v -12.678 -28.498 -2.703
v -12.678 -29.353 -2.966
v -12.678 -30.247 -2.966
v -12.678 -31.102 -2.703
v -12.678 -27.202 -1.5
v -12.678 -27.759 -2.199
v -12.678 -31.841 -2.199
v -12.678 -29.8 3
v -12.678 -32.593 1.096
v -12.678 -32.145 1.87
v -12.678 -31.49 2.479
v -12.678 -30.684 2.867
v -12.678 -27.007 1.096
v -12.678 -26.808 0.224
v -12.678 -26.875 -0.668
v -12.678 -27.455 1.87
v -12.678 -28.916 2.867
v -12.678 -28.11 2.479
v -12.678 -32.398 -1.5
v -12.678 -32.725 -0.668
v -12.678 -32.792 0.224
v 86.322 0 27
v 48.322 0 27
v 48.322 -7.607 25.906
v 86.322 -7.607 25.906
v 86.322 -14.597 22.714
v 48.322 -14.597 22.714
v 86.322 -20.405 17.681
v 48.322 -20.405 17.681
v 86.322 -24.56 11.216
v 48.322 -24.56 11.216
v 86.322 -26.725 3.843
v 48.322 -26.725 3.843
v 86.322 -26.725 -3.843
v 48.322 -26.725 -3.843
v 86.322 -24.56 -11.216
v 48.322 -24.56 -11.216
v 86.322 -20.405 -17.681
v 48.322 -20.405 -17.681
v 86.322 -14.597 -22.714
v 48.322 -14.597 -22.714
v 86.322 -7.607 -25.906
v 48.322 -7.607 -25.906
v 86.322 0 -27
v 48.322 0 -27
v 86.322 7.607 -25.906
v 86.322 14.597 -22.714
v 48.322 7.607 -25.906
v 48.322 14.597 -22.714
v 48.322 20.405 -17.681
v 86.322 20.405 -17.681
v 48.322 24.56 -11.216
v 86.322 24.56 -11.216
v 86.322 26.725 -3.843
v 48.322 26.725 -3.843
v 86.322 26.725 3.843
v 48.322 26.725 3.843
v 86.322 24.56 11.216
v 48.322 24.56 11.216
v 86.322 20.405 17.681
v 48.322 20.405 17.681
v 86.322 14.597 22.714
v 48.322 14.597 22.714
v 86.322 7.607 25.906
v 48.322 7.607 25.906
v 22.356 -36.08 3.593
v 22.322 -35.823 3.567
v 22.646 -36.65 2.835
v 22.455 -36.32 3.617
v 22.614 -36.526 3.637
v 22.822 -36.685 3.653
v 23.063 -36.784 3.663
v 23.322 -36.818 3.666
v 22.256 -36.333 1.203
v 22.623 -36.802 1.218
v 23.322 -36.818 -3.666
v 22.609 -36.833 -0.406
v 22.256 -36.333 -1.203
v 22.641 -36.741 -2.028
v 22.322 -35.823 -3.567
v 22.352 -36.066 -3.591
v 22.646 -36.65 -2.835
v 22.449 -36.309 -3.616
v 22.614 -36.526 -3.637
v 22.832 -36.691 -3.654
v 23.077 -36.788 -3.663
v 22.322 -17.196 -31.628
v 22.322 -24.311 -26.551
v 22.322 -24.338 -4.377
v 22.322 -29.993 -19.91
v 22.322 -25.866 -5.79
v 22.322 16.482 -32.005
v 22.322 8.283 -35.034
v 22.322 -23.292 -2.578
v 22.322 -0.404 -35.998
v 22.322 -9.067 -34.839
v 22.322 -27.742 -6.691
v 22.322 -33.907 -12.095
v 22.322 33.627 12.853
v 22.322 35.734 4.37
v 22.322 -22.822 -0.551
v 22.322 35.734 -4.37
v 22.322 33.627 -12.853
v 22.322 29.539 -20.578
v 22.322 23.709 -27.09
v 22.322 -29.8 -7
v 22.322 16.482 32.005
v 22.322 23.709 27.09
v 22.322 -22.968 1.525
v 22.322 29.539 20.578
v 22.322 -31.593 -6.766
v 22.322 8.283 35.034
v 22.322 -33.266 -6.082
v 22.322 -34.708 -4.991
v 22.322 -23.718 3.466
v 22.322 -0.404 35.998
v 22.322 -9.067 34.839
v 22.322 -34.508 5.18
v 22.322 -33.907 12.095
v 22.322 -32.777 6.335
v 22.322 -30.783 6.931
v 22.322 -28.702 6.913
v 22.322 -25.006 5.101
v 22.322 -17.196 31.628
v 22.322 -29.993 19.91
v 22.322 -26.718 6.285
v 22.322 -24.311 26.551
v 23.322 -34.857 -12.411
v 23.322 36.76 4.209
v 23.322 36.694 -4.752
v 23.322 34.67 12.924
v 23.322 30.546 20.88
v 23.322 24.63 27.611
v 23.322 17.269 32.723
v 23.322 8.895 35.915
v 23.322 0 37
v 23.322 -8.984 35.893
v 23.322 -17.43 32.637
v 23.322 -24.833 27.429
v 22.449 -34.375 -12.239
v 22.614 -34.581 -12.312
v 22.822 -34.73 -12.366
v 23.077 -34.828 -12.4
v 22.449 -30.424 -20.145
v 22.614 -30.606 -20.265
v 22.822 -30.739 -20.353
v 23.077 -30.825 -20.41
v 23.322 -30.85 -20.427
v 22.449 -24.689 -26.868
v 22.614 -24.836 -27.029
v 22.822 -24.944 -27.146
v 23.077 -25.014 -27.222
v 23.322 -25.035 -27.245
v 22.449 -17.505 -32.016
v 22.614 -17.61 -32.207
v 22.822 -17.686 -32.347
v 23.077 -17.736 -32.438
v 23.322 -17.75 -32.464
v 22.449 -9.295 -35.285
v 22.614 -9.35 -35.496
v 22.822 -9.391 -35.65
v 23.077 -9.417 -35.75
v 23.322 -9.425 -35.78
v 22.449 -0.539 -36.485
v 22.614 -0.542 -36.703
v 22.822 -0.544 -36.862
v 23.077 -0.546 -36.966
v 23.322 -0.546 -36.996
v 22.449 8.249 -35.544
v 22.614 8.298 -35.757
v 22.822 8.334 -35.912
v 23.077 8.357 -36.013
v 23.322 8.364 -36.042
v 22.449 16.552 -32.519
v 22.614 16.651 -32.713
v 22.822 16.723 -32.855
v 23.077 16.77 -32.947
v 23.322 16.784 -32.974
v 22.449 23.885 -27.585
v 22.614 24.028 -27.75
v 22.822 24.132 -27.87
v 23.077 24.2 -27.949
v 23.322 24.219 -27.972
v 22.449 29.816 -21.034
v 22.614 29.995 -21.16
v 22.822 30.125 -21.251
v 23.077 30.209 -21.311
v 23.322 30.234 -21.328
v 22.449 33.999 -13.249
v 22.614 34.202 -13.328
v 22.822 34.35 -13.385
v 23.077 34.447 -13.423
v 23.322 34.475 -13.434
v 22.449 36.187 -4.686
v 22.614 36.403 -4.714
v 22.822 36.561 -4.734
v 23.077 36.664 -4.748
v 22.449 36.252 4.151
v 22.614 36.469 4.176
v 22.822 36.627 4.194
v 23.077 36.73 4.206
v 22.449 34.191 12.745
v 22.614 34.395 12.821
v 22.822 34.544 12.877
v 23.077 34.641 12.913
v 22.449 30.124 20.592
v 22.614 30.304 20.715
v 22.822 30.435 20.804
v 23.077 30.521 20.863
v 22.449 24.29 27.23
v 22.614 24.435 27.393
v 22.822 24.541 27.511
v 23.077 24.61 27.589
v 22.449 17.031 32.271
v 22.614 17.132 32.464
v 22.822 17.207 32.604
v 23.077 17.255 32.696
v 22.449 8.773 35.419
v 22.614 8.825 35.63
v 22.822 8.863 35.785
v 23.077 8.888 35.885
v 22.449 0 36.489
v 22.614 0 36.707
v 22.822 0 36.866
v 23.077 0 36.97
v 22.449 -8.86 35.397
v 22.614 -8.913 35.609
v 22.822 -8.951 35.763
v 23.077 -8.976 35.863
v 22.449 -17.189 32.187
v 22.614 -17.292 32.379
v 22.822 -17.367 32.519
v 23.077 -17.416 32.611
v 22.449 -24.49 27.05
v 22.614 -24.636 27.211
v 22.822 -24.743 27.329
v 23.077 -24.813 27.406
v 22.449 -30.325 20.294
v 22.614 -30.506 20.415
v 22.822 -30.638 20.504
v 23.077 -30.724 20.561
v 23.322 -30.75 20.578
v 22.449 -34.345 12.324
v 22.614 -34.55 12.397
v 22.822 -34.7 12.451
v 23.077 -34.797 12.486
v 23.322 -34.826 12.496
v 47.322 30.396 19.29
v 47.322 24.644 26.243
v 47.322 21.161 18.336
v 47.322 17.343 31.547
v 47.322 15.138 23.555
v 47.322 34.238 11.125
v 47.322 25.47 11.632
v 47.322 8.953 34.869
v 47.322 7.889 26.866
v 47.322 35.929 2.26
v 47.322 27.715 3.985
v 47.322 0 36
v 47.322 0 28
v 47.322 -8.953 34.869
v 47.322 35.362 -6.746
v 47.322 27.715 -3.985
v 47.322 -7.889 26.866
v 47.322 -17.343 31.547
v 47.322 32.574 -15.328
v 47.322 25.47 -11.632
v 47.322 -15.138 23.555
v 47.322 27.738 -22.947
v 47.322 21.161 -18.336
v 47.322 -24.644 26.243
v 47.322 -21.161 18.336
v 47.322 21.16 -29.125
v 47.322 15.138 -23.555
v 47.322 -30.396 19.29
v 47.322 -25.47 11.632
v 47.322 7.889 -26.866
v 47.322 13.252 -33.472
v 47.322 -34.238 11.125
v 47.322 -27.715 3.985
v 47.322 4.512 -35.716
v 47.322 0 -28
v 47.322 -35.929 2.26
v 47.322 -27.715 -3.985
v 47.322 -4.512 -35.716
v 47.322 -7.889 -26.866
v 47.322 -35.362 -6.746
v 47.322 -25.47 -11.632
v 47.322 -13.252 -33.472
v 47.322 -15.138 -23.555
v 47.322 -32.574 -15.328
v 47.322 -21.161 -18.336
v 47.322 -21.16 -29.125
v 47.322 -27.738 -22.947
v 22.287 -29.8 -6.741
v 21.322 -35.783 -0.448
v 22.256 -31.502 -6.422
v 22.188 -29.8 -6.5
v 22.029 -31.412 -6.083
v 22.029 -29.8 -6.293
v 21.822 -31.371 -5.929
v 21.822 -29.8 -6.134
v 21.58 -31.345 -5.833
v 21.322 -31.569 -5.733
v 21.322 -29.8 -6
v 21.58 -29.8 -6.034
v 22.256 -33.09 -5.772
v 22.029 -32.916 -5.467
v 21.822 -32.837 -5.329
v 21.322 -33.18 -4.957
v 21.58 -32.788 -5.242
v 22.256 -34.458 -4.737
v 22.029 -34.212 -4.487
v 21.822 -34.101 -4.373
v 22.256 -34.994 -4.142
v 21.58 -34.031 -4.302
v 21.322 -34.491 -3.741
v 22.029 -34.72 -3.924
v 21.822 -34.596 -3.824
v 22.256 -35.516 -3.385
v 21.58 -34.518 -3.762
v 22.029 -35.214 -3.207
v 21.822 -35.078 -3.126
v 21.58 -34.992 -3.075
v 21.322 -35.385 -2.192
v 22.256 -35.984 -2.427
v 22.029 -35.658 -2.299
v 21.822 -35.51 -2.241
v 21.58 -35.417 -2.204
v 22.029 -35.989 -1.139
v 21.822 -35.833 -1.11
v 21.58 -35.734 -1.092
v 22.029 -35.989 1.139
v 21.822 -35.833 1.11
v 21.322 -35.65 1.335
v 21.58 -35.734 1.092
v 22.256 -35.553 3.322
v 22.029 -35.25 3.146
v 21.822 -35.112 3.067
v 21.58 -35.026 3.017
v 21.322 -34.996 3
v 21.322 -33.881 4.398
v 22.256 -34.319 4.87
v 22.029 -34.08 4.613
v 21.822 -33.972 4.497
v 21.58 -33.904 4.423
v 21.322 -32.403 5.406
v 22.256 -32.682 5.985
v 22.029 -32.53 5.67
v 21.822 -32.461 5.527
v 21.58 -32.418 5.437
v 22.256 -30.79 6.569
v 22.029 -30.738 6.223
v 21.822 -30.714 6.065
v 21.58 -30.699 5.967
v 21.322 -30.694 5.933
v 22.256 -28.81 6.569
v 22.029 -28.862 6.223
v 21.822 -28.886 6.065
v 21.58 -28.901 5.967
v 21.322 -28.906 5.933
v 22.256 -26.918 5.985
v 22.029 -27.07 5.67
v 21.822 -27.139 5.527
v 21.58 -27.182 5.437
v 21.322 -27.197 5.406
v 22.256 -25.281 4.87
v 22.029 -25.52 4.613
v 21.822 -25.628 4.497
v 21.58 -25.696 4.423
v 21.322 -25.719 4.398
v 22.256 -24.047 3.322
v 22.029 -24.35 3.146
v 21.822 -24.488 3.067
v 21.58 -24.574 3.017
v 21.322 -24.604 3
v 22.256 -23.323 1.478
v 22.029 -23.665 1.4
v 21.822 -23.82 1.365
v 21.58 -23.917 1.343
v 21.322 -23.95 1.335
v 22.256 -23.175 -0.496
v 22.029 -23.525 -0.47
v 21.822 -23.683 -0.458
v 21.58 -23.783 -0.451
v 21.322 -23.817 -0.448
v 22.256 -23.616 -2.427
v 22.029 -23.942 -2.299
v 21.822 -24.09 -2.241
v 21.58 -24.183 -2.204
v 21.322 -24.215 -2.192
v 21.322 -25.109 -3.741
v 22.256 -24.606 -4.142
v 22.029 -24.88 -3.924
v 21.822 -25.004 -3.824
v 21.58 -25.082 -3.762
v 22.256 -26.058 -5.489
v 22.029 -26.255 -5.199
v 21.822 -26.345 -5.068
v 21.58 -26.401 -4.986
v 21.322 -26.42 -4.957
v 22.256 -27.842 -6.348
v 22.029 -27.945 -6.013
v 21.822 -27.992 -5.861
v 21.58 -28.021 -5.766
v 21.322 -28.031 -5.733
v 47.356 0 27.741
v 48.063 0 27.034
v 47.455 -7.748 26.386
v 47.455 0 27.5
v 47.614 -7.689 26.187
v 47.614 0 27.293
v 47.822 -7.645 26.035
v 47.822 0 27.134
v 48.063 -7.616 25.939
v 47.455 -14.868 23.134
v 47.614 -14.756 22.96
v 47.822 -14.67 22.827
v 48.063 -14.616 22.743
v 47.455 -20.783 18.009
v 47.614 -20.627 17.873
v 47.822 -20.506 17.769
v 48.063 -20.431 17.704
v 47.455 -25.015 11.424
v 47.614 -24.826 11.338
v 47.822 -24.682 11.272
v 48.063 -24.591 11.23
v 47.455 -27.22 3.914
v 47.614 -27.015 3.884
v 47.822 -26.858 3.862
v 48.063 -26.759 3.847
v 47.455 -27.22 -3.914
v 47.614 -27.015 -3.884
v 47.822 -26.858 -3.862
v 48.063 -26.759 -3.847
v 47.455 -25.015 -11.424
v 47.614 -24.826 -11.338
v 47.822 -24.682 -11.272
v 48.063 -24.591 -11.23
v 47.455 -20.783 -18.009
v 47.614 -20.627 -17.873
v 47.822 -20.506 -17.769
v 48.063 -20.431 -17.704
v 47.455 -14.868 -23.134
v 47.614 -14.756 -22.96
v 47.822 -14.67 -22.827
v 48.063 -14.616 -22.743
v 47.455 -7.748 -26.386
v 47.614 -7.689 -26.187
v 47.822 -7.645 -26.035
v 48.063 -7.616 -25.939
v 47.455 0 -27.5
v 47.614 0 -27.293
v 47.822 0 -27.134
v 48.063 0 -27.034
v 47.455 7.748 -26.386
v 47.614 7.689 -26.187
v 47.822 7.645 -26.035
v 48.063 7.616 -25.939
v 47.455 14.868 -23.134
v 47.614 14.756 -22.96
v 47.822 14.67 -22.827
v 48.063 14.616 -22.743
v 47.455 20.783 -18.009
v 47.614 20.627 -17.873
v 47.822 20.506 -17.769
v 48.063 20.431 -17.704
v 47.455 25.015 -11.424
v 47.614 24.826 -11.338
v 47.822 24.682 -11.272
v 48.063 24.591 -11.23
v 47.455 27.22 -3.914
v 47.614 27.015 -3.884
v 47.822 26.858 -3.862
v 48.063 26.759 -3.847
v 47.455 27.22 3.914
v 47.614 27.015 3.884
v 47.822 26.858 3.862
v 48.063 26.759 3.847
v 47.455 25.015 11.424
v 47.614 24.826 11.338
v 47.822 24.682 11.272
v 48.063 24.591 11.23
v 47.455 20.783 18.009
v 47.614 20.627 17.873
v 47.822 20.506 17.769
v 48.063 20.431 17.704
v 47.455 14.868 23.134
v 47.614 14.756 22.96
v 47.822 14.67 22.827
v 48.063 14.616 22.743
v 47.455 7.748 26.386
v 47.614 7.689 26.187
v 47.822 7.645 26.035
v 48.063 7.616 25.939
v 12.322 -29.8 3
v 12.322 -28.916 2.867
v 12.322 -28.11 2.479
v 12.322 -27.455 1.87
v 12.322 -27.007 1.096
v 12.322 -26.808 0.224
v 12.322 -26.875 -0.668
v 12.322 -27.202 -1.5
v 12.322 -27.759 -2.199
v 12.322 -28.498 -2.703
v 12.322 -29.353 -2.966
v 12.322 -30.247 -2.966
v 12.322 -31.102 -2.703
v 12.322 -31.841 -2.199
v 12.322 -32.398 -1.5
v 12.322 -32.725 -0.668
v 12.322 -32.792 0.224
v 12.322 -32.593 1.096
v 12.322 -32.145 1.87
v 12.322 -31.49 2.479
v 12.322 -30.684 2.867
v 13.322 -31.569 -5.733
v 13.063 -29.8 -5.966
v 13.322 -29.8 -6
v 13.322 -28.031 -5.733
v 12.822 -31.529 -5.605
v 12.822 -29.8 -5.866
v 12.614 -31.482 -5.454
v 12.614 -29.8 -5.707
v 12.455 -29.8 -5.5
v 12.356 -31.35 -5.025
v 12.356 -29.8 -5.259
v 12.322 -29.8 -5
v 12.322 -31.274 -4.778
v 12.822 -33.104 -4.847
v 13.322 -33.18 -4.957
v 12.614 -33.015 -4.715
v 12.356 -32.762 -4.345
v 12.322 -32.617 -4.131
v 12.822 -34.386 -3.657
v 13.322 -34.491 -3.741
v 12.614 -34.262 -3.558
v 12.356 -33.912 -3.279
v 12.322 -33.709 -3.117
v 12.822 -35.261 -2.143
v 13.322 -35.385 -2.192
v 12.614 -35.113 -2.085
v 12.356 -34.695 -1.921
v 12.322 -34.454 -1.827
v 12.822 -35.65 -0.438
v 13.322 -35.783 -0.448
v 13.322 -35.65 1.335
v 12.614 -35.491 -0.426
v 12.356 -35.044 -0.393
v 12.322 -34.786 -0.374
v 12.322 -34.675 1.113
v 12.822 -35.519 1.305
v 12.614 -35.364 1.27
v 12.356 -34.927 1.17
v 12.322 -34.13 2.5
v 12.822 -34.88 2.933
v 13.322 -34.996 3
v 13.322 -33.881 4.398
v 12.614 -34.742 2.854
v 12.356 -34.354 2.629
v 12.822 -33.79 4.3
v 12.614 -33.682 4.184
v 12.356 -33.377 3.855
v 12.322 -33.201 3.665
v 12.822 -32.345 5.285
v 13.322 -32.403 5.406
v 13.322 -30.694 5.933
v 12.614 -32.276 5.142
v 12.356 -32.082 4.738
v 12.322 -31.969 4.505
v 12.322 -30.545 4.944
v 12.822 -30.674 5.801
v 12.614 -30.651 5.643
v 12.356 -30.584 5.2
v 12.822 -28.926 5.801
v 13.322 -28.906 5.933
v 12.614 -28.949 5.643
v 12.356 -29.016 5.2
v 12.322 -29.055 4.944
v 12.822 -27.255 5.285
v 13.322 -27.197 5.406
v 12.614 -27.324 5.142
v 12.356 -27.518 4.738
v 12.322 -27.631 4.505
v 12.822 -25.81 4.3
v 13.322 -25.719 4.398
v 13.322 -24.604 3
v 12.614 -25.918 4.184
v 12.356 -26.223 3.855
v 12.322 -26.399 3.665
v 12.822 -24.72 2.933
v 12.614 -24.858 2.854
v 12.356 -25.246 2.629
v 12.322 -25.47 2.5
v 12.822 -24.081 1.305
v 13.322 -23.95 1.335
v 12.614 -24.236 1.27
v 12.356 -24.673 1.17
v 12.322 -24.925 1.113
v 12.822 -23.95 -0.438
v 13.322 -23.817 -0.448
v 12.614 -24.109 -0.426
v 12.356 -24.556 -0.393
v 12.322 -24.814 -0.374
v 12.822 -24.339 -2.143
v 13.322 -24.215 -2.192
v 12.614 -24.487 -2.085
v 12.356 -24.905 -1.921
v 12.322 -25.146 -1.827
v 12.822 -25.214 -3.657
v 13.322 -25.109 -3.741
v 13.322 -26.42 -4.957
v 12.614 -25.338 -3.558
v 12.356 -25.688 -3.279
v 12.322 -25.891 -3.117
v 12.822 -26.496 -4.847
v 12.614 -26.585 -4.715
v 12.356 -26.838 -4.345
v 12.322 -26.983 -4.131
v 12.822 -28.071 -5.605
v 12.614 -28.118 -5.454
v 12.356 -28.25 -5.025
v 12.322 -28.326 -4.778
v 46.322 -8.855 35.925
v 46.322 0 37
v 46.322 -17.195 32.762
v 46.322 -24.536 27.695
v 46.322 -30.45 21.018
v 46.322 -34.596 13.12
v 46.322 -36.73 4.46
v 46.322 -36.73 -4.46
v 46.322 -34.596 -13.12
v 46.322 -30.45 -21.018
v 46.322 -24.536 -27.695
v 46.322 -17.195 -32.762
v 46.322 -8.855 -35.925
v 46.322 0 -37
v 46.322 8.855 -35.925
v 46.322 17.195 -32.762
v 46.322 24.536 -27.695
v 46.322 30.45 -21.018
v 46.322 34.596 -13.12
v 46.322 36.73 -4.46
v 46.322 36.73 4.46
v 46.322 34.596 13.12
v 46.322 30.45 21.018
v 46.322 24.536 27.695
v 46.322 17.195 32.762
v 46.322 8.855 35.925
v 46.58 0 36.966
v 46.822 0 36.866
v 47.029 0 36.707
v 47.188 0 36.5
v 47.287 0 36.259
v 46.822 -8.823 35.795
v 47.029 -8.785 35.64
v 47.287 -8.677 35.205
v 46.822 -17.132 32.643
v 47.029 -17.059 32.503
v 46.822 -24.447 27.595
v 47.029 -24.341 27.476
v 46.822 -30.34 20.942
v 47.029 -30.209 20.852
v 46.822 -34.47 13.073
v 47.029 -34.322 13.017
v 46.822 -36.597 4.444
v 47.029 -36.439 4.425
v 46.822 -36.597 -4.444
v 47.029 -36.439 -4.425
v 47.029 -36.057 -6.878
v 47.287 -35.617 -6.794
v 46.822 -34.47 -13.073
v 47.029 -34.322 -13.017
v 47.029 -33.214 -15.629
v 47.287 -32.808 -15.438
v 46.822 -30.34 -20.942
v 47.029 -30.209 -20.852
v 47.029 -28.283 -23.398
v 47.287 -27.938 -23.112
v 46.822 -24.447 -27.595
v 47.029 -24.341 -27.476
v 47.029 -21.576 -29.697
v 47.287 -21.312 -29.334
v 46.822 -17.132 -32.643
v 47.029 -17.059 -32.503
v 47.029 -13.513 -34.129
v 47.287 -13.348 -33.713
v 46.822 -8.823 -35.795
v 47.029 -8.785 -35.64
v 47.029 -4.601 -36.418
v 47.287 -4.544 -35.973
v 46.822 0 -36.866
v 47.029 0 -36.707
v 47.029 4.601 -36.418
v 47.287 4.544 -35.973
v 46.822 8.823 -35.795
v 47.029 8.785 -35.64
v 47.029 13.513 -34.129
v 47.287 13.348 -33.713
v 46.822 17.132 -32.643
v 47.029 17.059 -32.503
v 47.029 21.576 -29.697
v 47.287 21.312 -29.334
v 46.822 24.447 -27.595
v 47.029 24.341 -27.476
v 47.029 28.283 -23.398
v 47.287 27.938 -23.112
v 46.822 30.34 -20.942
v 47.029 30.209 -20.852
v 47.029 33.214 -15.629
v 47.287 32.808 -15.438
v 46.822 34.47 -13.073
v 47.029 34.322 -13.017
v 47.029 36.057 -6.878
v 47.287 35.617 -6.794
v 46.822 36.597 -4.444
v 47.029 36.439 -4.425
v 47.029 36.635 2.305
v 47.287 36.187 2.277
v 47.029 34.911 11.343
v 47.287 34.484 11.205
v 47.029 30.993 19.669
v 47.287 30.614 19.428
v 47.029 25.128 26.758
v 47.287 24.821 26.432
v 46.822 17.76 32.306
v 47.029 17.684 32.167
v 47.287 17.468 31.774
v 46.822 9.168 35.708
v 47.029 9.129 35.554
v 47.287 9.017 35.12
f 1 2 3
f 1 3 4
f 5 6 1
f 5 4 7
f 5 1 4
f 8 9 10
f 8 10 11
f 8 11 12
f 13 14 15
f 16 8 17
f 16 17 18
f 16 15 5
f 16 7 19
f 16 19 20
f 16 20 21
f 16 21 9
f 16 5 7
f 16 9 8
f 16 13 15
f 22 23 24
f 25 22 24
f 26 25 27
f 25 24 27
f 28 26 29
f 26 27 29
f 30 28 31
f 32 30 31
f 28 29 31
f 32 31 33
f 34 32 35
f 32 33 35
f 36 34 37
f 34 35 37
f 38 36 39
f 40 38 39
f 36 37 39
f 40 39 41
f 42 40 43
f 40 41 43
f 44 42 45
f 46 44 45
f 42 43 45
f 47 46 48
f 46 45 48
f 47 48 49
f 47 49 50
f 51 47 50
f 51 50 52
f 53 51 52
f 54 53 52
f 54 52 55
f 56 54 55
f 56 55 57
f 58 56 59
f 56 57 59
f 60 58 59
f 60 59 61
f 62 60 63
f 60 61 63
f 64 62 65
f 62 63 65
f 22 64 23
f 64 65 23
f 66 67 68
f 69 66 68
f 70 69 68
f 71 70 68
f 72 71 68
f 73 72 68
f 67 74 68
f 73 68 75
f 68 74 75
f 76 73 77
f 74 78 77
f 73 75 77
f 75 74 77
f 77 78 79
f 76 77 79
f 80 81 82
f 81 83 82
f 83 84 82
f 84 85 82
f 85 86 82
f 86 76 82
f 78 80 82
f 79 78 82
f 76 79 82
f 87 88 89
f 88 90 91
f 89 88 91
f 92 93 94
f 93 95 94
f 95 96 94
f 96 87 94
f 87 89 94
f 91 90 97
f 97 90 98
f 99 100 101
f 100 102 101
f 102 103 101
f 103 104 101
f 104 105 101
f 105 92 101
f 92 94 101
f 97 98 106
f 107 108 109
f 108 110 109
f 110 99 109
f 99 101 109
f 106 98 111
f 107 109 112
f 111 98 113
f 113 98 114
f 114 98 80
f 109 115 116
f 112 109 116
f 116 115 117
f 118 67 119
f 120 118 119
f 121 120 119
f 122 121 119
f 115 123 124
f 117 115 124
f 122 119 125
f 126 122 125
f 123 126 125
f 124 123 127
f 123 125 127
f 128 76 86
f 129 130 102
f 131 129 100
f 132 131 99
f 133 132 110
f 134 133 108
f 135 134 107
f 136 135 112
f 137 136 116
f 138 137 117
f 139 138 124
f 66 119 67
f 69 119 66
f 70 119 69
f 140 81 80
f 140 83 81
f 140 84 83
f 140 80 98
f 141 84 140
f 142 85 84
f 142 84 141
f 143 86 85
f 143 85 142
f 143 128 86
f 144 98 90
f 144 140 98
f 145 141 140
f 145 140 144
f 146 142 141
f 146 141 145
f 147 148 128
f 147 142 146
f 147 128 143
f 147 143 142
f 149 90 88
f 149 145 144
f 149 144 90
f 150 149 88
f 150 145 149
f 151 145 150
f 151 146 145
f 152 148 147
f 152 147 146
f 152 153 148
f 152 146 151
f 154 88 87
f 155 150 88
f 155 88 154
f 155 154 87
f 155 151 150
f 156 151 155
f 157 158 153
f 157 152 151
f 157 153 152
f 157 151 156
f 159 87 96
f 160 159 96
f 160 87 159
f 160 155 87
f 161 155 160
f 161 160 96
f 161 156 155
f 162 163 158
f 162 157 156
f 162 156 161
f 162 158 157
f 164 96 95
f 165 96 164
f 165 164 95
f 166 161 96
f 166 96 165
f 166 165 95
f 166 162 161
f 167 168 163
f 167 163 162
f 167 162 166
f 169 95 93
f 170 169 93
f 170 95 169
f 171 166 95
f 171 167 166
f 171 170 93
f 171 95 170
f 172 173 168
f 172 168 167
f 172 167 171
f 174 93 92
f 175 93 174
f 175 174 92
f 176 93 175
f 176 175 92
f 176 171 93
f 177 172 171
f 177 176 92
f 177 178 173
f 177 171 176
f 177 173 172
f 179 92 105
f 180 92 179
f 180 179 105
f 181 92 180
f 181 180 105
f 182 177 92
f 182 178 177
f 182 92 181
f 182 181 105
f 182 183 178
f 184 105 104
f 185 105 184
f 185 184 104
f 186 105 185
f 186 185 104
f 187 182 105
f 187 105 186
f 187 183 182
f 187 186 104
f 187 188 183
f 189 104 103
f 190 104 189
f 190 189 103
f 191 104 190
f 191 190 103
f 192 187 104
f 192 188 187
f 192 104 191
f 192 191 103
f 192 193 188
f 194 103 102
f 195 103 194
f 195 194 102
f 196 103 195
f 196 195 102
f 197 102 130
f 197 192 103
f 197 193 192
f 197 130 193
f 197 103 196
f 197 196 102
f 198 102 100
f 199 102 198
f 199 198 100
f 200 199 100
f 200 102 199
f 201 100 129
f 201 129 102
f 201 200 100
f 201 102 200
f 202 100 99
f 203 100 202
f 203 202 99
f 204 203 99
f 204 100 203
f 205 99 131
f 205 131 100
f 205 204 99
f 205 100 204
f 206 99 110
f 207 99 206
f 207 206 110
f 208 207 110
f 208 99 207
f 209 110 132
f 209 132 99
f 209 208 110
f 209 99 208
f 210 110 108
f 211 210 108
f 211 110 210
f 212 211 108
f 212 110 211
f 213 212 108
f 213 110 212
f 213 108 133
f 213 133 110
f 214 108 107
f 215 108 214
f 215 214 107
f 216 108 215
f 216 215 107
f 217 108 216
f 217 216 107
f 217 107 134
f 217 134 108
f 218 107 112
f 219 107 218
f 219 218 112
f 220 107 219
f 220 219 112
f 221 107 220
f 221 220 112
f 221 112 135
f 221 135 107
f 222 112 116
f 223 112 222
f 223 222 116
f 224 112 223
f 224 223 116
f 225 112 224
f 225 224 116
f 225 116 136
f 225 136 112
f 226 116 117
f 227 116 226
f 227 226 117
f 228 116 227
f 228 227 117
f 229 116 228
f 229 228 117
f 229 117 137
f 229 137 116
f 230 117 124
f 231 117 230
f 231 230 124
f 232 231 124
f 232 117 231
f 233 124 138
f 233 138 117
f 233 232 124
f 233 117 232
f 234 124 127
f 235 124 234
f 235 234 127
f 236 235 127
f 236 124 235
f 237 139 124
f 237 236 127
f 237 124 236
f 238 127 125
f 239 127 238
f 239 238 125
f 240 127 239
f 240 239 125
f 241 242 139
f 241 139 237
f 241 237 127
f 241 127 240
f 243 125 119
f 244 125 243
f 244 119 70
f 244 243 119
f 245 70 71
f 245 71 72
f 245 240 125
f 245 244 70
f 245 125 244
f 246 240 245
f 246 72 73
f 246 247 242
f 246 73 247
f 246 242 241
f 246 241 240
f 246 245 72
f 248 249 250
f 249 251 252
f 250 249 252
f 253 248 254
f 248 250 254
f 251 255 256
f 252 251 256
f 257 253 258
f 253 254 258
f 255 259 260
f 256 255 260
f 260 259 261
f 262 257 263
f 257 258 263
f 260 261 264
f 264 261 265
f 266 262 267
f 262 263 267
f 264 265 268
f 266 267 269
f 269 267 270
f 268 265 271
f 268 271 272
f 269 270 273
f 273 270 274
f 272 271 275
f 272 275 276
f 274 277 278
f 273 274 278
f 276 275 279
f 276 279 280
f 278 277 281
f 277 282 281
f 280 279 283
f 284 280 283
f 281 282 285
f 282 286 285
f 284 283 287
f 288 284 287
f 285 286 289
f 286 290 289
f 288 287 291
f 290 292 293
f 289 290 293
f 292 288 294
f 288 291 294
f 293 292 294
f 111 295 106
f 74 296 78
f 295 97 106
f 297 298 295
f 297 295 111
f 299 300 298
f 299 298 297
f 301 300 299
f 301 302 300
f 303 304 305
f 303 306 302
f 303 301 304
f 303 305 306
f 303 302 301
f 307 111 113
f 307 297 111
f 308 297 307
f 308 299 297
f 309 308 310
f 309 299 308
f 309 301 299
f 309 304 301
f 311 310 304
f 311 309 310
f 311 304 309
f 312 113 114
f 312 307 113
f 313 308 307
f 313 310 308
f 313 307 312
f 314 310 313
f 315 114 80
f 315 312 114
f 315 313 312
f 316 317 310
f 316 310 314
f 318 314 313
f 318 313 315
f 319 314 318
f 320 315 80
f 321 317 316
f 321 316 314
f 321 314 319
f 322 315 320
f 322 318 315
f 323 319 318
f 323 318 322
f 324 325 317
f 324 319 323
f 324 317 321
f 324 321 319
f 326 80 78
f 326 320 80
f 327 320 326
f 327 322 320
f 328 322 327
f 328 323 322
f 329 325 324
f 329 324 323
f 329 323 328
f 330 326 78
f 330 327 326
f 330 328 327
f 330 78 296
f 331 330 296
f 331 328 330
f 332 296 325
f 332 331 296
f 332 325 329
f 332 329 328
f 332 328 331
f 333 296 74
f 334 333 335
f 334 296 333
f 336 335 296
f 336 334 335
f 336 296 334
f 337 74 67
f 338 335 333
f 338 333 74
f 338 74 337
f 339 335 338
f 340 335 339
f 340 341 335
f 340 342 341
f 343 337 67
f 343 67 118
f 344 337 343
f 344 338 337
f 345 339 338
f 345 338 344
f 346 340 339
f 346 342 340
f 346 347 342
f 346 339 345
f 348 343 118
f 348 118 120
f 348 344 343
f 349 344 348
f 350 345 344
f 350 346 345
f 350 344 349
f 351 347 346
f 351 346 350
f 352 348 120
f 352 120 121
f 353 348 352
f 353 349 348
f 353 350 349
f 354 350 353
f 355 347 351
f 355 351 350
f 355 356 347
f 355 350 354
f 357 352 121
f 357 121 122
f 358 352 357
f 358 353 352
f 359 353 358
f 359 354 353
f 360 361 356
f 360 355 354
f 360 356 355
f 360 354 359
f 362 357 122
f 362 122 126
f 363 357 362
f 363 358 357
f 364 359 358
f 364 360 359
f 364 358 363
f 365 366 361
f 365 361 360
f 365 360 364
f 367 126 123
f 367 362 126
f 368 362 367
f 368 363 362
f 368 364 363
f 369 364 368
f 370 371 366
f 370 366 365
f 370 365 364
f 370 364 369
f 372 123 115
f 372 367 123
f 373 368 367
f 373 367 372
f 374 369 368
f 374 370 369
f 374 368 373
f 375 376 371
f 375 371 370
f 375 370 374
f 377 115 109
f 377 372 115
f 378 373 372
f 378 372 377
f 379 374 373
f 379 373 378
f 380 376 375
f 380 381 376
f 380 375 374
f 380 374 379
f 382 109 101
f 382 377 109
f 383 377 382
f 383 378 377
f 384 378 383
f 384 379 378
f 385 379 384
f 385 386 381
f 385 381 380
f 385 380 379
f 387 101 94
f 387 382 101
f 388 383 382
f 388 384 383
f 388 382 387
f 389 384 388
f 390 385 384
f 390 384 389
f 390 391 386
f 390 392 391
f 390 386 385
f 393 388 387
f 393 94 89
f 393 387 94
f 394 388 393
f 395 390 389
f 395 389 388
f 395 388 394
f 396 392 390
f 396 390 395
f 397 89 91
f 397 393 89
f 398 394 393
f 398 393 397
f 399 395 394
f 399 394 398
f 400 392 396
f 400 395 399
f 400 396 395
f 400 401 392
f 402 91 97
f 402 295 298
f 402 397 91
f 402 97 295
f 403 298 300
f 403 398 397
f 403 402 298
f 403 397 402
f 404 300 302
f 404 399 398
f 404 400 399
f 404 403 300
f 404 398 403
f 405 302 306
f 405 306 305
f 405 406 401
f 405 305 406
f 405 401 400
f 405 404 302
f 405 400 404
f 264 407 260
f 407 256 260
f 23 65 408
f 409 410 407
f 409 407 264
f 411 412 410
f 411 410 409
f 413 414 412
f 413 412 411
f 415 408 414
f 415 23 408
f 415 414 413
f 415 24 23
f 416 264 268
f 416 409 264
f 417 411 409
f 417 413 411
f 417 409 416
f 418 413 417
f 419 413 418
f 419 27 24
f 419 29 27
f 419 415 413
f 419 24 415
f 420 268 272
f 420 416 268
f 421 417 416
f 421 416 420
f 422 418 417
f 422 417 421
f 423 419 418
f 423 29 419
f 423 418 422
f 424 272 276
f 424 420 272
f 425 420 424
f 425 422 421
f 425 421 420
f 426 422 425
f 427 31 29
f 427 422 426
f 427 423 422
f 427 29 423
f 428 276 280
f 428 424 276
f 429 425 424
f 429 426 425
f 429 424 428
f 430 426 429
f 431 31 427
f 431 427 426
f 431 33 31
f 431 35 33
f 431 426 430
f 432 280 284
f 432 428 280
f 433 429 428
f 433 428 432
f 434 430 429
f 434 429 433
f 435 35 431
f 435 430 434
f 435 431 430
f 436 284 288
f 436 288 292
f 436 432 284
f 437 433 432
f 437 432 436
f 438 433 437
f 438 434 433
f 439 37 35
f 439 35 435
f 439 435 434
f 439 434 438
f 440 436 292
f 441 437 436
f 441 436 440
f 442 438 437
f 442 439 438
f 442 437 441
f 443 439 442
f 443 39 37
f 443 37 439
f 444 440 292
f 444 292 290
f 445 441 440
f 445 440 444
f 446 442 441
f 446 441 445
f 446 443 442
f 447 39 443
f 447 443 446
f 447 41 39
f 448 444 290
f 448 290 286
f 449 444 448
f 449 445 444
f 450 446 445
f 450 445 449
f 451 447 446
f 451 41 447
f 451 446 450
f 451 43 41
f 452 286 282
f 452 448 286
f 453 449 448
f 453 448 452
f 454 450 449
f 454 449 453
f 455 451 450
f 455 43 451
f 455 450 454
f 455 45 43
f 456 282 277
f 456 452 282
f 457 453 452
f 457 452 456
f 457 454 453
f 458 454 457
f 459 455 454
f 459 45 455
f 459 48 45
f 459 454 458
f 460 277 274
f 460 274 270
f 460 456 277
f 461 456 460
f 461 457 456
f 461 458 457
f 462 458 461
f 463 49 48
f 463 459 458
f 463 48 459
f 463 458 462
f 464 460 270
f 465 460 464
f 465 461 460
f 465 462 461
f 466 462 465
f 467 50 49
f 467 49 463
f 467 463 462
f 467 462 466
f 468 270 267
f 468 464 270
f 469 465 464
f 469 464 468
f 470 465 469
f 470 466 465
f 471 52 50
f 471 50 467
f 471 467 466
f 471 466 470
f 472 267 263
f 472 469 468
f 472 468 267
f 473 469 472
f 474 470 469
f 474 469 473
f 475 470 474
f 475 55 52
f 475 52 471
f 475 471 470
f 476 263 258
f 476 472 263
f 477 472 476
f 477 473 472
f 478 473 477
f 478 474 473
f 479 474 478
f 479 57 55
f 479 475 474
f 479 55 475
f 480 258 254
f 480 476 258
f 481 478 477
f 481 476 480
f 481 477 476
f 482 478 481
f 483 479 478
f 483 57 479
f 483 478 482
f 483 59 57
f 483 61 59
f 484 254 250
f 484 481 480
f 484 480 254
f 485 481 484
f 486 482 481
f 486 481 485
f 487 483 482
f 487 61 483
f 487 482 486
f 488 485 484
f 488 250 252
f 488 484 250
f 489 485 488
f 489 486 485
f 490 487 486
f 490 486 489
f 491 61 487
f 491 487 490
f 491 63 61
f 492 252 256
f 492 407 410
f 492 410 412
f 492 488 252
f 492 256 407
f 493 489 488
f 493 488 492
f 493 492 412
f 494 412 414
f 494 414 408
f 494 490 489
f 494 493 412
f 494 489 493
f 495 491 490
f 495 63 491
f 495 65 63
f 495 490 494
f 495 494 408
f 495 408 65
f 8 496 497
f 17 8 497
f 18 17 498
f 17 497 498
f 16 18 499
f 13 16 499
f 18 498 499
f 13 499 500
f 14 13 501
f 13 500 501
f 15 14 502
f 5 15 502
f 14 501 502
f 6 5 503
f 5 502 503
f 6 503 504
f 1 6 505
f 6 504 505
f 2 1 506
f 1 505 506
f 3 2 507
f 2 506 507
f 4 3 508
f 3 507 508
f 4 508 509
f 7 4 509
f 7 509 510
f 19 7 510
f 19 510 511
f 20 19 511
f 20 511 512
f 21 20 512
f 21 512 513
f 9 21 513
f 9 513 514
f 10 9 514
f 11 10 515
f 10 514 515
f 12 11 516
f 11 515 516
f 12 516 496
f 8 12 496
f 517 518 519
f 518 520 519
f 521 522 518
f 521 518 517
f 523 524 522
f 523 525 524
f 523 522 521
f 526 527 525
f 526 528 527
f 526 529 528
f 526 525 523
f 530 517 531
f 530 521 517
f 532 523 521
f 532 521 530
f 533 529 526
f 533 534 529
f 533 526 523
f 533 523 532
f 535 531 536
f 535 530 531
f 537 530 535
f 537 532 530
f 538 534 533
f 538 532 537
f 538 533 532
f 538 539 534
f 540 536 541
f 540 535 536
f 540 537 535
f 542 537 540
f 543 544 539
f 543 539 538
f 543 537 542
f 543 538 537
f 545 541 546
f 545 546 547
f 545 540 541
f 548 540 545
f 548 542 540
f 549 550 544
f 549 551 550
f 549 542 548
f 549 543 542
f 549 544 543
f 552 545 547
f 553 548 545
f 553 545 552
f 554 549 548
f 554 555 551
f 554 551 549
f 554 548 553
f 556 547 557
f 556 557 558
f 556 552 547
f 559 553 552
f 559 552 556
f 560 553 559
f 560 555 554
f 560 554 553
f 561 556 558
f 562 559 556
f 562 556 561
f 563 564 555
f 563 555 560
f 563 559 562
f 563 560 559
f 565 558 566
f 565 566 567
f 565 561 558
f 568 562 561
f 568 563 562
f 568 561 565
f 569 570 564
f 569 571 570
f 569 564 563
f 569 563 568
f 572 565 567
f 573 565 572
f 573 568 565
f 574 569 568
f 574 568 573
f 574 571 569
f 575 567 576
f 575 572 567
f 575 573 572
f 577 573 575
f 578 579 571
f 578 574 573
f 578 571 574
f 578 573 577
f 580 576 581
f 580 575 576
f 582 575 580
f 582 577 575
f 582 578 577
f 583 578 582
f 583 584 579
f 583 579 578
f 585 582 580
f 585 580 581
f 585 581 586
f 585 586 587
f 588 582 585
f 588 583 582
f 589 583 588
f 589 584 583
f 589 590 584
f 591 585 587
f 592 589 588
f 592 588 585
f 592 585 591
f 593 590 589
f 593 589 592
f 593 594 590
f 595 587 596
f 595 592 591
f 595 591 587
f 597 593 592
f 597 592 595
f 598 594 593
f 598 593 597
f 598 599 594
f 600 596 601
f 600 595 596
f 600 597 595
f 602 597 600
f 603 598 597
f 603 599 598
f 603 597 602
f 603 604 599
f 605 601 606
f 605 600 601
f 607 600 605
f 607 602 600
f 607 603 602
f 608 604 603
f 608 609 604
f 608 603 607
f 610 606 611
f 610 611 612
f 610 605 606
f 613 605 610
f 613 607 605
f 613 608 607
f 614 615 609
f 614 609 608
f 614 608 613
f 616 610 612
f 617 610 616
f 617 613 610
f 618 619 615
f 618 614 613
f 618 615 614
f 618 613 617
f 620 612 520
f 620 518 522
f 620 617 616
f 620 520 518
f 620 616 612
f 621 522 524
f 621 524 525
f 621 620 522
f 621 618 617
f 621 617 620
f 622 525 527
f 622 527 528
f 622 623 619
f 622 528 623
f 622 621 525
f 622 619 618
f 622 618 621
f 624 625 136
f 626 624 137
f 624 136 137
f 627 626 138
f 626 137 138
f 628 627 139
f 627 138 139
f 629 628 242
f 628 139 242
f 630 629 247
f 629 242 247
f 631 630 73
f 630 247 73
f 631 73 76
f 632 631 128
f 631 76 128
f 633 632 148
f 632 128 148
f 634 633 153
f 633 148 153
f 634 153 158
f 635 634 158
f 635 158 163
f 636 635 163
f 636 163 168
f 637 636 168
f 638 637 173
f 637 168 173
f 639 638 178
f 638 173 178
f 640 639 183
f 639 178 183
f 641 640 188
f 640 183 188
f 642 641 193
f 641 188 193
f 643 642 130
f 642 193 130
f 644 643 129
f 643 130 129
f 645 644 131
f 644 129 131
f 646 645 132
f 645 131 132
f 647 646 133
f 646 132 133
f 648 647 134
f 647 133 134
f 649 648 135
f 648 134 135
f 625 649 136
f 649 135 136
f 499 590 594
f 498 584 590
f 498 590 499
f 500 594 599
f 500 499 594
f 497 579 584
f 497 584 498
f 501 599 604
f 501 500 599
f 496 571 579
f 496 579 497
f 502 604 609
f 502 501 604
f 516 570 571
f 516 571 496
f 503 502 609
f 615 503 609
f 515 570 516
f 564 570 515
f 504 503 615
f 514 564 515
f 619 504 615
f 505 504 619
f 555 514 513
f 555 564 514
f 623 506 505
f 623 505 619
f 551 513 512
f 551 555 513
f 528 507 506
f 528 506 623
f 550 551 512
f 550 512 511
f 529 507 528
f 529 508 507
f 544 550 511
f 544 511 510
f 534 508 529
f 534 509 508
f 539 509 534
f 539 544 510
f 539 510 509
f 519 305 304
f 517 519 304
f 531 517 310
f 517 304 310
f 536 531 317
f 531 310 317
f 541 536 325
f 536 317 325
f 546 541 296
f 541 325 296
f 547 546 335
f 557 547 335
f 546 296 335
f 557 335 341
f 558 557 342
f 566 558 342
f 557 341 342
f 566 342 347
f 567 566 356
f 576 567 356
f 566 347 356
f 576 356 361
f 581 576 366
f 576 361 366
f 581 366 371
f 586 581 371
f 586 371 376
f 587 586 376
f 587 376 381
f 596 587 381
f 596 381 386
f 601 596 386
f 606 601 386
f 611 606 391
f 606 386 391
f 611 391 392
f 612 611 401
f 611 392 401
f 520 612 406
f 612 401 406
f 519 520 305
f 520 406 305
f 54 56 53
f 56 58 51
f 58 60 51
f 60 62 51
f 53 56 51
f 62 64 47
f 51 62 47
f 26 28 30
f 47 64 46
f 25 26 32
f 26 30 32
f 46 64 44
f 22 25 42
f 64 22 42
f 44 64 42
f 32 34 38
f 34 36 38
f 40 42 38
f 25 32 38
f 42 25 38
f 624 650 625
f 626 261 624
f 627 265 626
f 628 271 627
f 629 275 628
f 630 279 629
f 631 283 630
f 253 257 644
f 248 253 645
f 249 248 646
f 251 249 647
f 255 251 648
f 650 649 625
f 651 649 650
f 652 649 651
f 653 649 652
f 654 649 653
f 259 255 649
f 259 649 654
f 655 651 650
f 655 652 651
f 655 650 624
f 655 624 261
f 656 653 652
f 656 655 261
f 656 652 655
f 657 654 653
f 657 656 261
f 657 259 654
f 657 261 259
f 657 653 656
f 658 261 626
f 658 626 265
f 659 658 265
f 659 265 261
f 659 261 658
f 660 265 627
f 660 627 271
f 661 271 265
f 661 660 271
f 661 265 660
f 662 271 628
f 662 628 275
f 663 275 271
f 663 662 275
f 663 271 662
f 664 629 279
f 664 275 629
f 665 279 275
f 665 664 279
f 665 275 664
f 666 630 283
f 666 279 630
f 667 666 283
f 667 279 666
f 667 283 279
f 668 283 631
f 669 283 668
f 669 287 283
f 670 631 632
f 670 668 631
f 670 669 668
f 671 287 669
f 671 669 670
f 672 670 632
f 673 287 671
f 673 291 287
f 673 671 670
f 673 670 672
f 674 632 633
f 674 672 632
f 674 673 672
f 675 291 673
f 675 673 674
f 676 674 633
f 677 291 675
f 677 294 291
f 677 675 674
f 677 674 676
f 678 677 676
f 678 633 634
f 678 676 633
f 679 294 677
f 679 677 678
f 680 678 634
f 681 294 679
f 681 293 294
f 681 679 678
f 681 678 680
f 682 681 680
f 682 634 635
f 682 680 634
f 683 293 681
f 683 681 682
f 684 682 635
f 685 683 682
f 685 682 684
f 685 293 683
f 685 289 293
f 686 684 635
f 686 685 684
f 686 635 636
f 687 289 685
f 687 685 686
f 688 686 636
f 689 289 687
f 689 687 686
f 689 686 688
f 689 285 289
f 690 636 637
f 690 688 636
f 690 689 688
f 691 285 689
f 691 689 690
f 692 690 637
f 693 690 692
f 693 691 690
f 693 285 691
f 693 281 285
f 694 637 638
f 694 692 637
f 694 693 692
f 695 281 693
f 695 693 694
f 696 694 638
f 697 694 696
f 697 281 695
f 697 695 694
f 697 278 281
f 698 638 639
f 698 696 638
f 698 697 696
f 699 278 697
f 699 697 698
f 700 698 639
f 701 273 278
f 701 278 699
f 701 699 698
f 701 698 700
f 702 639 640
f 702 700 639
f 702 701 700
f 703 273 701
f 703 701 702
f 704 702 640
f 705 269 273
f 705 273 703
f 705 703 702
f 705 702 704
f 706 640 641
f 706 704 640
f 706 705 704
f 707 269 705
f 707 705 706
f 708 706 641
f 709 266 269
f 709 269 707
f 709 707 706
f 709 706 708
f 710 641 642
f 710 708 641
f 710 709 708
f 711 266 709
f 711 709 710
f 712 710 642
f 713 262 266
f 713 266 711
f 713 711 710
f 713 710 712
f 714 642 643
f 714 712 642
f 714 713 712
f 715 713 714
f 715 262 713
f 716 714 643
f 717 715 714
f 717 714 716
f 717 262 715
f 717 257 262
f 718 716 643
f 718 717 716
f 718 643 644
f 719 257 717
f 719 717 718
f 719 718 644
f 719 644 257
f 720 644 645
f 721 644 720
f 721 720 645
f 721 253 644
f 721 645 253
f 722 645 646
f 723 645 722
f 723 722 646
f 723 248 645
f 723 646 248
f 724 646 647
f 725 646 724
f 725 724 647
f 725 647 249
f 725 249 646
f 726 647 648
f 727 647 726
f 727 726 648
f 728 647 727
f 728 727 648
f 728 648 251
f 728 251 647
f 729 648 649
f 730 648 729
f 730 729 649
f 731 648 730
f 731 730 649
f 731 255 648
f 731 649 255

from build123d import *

# Parameters (mm, degrees)
SKETCH3_R           = 6
BOSS_EXTRUDE1_DEPTH = 10
FILLET1_R           = 1
FILLET2_R           = 1
SKETCH4_R           = 3
BOSS_EXTRUDE2_DEPTH = 25


with BuildPart() as part:
    # Sketch1 → Revolve1 (revolve)
    with BuildSketch(Plane.XY, mode=Mode.PRIVATE) as revolve1_sk:
        Polygon((86.321505474, 27), (47.321505474, 27), (47.321505474, 37), (22.321505474, 37), (22.321505474, 0), (86.321505474, 0), align=None)
    revolve(revolve1_sk.sketch.rotate(Axis((-66.563531294, 0, 0), (1, 0, 0)), 90), axis=Axis((-66.563531294, 0, 0), (1, 0, 0)))

    # Sketch3 → Boss-Extrude1 (add)
    with BuildSketch(Plane.ZY.offset(-22.321505474)):
        with Locations(Location((0, -29.8, 0), (0, 0, 180))):
            Circle(SKETCH3_R)
    extrude(amount=BOSS_EXTRUDE1_DEPTH)

    # Fillet1
    fillet1_edges = [part.edges().sort_by_distance(p)[0] for p in [
        (22.321505474, -29.8, 6),
        (12.321505474, -29.8, 6),
    ]]
    fillet(fillet1_edges, radius=FILLET1_R)

    # Fillet2
    fillet2_edges = [part.edges().sort_by_distance(p)[0] for p in [
        (47.321505474, 0, -37),
        (22.321505474, 0, -37),
        (47.321505474, 0, -27),
    ]]
    fillet(fillet2_edges, radius=FILLET2_R)

    # Sketch4 → Boss-Extrude2 (add)
    with BuildSketch(Plane.ZY.offset(-12.321505474)):
        with Locations((0, -29.8)):
            Circle(SKETCH4_R)
    extrude(amount=BOSS_EXTRUDE2_DEPTH)


solid = part.part
